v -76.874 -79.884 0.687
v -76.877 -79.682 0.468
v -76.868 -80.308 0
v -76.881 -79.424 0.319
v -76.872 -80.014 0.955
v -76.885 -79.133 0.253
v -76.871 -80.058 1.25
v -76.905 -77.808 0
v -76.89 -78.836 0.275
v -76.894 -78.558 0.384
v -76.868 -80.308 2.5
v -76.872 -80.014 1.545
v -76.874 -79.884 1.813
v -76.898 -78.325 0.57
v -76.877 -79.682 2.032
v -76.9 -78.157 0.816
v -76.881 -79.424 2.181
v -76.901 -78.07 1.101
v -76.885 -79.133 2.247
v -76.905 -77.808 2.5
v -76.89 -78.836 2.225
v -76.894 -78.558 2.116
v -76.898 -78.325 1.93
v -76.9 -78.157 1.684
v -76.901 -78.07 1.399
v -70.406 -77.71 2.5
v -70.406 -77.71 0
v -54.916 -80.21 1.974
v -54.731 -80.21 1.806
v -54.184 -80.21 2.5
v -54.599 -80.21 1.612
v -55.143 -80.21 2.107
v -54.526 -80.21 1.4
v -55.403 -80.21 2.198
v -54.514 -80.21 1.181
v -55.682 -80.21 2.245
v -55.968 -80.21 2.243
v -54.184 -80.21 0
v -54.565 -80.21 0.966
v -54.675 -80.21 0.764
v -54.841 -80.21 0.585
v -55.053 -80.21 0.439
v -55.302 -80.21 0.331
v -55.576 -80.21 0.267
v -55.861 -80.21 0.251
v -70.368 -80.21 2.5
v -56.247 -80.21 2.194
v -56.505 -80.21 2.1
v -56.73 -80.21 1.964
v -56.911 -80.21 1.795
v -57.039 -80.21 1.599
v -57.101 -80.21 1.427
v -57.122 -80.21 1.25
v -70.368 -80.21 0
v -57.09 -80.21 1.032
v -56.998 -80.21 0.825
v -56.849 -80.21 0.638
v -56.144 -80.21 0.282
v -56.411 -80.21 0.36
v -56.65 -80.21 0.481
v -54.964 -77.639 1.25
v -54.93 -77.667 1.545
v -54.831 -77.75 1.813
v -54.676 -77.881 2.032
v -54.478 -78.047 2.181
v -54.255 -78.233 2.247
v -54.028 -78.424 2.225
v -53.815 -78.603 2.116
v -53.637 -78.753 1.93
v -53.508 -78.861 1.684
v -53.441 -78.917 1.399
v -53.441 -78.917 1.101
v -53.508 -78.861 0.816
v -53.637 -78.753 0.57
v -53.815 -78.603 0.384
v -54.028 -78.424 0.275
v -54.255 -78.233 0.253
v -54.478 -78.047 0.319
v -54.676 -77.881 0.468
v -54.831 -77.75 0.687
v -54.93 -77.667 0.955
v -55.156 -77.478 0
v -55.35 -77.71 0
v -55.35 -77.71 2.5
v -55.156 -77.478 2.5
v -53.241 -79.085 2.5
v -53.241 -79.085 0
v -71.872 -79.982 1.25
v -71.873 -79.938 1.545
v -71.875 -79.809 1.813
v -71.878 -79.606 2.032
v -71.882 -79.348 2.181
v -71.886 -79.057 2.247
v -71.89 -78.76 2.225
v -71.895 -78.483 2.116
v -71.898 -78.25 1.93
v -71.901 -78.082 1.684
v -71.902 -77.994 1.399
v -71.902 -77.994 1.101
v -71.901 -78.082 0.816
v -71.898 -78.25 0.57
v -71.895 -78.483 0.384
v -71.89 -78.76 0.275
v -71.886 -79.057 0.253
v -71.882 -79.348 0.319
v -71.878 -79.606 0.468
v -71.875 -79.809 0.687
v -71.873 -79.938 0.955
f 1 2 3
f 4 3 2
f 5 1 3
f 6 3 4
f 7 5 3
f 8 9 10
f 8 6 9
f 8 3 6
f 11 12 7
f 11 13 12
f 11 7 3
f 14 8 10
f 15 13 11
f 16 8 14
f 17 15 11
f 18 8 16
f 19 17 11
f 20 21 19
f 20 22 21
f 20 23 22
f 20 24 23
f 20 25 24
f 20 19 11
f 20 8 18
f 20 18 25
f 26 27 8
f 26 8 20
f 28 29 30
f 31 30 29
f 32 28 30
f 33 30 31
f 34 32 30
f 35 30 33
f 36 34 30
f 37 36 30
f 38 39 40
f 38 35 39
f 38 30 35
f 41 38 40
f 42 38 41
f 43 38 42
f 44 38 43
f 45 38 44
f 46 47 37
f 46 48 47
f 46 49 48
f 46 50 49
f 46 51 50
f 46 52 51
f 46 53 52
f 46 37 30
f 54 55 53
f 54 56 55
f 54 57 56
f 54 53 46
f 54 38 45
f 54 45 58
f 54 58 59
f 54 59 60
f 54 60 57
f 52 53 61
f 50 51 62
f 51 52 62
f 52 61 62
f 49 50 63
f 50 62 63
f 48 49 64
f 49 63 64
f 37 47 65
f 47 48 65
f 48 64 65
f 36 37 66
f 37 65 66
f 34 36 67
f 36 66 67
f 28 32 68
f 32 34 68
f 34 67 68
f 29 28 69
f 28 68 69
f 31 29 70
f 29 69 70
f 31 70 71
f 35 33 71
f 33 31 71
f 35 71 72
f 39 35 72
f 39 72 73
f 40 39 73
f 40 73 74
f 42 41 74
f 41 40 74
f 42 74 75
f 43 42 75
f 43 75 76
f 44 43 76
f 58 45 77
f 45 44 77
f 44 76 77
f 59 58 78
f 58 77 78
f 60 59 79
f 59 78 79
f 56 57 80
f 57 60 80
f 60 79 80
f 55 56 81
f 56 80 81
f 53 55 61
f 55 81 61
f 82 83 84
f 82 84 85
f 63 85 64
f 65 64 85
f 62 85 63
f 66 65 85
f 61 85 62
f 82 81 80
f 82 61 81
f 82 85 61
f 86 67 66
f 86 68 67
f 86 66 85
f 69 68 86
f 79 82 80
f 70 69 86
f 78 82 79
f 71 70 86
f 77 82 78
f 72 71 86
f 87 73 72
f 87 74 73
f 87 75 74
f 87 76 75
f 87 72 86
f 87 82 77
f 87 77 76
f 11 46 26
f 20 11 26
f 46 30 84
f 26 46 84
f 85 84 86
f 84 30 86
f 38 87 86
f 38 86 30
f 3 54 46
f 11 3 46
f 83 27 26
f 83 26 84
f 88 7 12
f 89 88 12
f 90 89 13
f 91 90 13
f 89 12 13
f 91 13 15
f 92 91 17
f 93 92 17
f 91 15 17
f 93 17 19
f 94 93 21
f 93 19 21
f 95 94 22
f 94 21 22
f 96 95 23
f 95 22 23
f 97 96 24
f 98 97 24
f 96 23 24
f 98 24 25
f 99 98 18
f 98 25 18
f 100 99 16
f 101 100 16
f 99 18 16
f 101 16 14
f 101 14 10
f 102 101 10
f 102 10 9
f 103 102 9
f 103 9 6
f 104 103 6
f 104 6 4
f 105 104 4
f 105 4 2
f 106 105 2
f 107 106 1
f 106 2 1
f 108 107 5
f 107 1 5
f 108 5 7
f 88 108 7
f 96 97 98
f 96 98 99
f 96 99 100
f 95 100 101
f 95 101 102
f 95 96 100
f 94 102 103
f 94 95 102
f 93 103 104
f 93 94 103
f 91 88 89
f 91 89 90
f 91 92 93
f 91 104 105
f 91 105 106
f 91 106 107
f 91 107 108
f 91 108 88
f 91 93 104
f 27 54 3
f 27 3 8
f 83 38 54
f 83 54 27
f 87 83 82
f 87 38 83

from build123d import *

# Parameters (mm, degrees)
BOSS_EXTRUDE1_DEPTH = 2.5
SKETCH2_R           = 1
CUT_EXTRUDE1_DEPTH  = 4.5
SKETCH3_R           = 1
CUT_EXTRUDE2_DEPTH  = 9.5
SKETCH5_R           = 1
BOSS_EXTRUDE2_DEPTH = 9.5
SKETCH7_W           = 2.5
SKETCH7_H           = 2.48697386
BOSS_EXTRUDE5_DEPTH = 17
SKETCH8_R           = 1
CUT_EXTRUDE3_DEPTH  = 9.5
SKETCH9_W           = 2.5
SKETCH9_H           = 2.510853282
CUT_EXTRUDE4_DEPTH  = 10.5
SKETCH10_R          = 1
CUT_EXTRUDE5_DEPTH  = 4.5
SKETCH11_R          = 1
BOSS_EXTRUDE6_DEPTH = 4.5
SKETCH12_R          = 1
CUT_EXTRUDE6_DEPTH  = 4
SKETCH13_W          = 2.5
SKETCH13_H          = 2.5
CUT_EXTRUDE7_DEPTH  = 6.5
SKETCH14_W          = 2.5
SKETCH14_H          = 2.5
BOSS_EXTRUDE7_DEPTH = 6.5
SKETCH15_R          = 1
CUT_EXTRUDE8_DEPTH  = 5


with BuildPart() as part:
    # Sketch1 → Boss-Extrude1 (new body)
    with BuildSketch(Plane.XY):
        Polygon((-70.406172668, -77.710060133), (-55.350496572, -77.710060133), (-55.155758053, -77.477979804), (-53.240646945, -79.084948828), (-54.184487309, -80.209773972), (-70.368347793, -80.209773972), align=None)
    extrude(amount=BOSS_EXTRUDE1_DEPTH)

    # Sketch2 → Cut-Extrude1 (cut)
    with BuildSketch(Plane(origin=(-60.939488189, -72.62485398, 0), x_dir=(0, 0, -1), z_dir=(0.6427876096865354, 0.7660444431189815, 0))):
        with Locations(Location((-1.25, -8.800123479, 0), (0, 0, 90))):
            Circle(SKETCH2_R)
    extrude(amount=-CUT_EXTRUDE1_DEPTH, mode=Mode.SUBTRACT)

    # Sketch3 → Cut-Extrude2 (cut)
    with BuildSketch(Plane(origin=(-71.565670343, -1.082908957, 0), x_dir=(0, 0, 1), z_dir=(-0.9998855357578962, -0.015129949839474955, 0))):
        with Locations(Location((1.25, -77.885923249, 0), (0, 0, 270))):
            Circle(SKETCH3_R)
    extrude(amount=-CUT_EXTRUDE2_DEPTH, mode=Mode.SUBTRACT)

    # Sketch5 → Boss-Extrude2 (add)
    with BuildSketch(Plane(origin=(-71.565670343, -1.082908957, 0), x_dir=(0, 0, 1), z_dir=(-0.9998855357578961, -0.015129949839476386, 0))):
        with Locations((1.25, -77.885923249)):
            Circle(SKETCH5_R)
    extrude(amount=-BOSS_EXTRUDE2_DEPTH)

    # Sketch7 → Boss-Extrude5 (add)
    with BuildSketch(Plane(origin=(-71.565670343, -1.082908957, 0), x_dir=(0, 0, 1), z_dir=(-0.9998855357578961, -0.015129949839476386, 0))):
        with Locations((1.25, -77.879410179)):
            Rectangle(SKETCH7_W, SKETCH7_H)
    extrude(amount=BOSS_EXTRUDE5_DEPTH)

    # Sketch8 → Cut-Extrude3 (cut)
    with BuildSketch(Plane(origin=(-88.56372445, -1.340118104, 0), x_dir=(0, 0, 1), z_dir=(-0.9998855357578962, -0.015129949839480206, 0))):
        with Locations(Location((1.25, -77.885923249, 0), (0, 0, 270))):
            Circle(SKETCH8_R)
    extrude(amount=-CUT_EXTRUDE3_DEPTH, mode=Mode.SUBTRACT)

    # Sketch9 → Cut-Extrude4 (cut)
    with BuildSketch(Plane(origin=(-88.56372445, -1.340118104, 0), x_dir=(0, 0, 1), z_dir=(-0.9998855357578962, -0.015129949839480206, 0))):
        with Locations((1.25, -77.89134989)):
            Rectangle(SKETCH9_W, SKETCH9_H)
    extrude(amount=-CUT_EXTRUDE4_DEPTH, mode=Mode.SUBTRACT)

    # Sketch10 → Cut-Extrude5 (cut)
    with BuildSketch(Plane(origin=(-78.064926325, -1.181253631, 0), x_dir=(0, 0, 1), z_dir=(-0.9998855357578961, -0.015129949839478678, 0))):
        with Locations(Location((1.25, -77.885923249, 0), (0, 0, 270))):
            Circle(SKETCH10_R)
    extrude(amount=-CUT_EXTRUDE5_DEPTH, mode=Mode.SUBTRACT)

    # Sketch11 → Boss-Extrude6 (add)
    with BuildSketch(Plane(origin=(-78.064926325, -1.181253631, 0), x_dir=(0, 0, 1), z_dir=(-0.9998855357578961, -0.015129949839478678, 0))):
        with Locations((1.25, -77.885923249)):
            Circle(SKETCH11_R)
    extrude(amount=-BOSS_EXTRUDE6_DEPTH)

    # Sketch12 → Cut-Extrude6 (cut)
    with BuildSketch(Plane(origin=(-78.064926325, -1.181253631, 0), x_dir=(0, 0, 1), z_dir=(-0.9998855357578961, -0.015129949839478678, 0))):
        with Locations(Location((1.25, -77.885923249, 0), (0, 0, 270))):
            Circle(SKETCH12_R)
    extrude(amount=-CUT_EXTRUDE6_DEPTH, mode=Mode.SUBTRACT)

    # Sketch13 → Cut-Extrude7 (cut)
    with BuildSketch(Plane(origin=(-78.064926325, -1.181253631, 0), x_dir=(0, 0, 1), z_dir=(-0.9998855357578961, -0.015129949839478678, 0))):
        with Locations((1.25, -77.885923249)):
            Rectangle(SKETCH13_W, SKETCH13_H)
    extrude(amount=-CUT_EXTRUDE7_DEPTH, mode=Mode.SUBTRACT)

    # Sketch14 → Boss-Extrude7 (add)
    with BuildSketch(Plane(origin=(-71.565670343, -1.082908957, 0), x_dir=(0, 0, 1), z_dir=(-0.9998855357578961, -0.015129949839476386, 0))):
        with Locations((1.25, -77.885923249)):
            Rectangle(SKETCH14_W, SKETCH14_H)
    extrude(amount=BOSS_EXTRUDE7_DEPTH)

    # Sketch15 → Cut-Extrude8 (cut)
    with BuildSketch(Plane(origin=(-78.064926325, -1.181253631, 0), x_dir=(0, 0, 1), z_dir=(-0.9998855357578961, -0.01512994983947622, 0))):
        with Locations(Location((1.25, -77.885923249, 0), (0, 0, 270))):
            Circle(SKETCH15_R)
    extrude(amount=-CUT_EXTRUDE8_DEPTH, mode=Mode.SUBTRACT)


solid = part.part
